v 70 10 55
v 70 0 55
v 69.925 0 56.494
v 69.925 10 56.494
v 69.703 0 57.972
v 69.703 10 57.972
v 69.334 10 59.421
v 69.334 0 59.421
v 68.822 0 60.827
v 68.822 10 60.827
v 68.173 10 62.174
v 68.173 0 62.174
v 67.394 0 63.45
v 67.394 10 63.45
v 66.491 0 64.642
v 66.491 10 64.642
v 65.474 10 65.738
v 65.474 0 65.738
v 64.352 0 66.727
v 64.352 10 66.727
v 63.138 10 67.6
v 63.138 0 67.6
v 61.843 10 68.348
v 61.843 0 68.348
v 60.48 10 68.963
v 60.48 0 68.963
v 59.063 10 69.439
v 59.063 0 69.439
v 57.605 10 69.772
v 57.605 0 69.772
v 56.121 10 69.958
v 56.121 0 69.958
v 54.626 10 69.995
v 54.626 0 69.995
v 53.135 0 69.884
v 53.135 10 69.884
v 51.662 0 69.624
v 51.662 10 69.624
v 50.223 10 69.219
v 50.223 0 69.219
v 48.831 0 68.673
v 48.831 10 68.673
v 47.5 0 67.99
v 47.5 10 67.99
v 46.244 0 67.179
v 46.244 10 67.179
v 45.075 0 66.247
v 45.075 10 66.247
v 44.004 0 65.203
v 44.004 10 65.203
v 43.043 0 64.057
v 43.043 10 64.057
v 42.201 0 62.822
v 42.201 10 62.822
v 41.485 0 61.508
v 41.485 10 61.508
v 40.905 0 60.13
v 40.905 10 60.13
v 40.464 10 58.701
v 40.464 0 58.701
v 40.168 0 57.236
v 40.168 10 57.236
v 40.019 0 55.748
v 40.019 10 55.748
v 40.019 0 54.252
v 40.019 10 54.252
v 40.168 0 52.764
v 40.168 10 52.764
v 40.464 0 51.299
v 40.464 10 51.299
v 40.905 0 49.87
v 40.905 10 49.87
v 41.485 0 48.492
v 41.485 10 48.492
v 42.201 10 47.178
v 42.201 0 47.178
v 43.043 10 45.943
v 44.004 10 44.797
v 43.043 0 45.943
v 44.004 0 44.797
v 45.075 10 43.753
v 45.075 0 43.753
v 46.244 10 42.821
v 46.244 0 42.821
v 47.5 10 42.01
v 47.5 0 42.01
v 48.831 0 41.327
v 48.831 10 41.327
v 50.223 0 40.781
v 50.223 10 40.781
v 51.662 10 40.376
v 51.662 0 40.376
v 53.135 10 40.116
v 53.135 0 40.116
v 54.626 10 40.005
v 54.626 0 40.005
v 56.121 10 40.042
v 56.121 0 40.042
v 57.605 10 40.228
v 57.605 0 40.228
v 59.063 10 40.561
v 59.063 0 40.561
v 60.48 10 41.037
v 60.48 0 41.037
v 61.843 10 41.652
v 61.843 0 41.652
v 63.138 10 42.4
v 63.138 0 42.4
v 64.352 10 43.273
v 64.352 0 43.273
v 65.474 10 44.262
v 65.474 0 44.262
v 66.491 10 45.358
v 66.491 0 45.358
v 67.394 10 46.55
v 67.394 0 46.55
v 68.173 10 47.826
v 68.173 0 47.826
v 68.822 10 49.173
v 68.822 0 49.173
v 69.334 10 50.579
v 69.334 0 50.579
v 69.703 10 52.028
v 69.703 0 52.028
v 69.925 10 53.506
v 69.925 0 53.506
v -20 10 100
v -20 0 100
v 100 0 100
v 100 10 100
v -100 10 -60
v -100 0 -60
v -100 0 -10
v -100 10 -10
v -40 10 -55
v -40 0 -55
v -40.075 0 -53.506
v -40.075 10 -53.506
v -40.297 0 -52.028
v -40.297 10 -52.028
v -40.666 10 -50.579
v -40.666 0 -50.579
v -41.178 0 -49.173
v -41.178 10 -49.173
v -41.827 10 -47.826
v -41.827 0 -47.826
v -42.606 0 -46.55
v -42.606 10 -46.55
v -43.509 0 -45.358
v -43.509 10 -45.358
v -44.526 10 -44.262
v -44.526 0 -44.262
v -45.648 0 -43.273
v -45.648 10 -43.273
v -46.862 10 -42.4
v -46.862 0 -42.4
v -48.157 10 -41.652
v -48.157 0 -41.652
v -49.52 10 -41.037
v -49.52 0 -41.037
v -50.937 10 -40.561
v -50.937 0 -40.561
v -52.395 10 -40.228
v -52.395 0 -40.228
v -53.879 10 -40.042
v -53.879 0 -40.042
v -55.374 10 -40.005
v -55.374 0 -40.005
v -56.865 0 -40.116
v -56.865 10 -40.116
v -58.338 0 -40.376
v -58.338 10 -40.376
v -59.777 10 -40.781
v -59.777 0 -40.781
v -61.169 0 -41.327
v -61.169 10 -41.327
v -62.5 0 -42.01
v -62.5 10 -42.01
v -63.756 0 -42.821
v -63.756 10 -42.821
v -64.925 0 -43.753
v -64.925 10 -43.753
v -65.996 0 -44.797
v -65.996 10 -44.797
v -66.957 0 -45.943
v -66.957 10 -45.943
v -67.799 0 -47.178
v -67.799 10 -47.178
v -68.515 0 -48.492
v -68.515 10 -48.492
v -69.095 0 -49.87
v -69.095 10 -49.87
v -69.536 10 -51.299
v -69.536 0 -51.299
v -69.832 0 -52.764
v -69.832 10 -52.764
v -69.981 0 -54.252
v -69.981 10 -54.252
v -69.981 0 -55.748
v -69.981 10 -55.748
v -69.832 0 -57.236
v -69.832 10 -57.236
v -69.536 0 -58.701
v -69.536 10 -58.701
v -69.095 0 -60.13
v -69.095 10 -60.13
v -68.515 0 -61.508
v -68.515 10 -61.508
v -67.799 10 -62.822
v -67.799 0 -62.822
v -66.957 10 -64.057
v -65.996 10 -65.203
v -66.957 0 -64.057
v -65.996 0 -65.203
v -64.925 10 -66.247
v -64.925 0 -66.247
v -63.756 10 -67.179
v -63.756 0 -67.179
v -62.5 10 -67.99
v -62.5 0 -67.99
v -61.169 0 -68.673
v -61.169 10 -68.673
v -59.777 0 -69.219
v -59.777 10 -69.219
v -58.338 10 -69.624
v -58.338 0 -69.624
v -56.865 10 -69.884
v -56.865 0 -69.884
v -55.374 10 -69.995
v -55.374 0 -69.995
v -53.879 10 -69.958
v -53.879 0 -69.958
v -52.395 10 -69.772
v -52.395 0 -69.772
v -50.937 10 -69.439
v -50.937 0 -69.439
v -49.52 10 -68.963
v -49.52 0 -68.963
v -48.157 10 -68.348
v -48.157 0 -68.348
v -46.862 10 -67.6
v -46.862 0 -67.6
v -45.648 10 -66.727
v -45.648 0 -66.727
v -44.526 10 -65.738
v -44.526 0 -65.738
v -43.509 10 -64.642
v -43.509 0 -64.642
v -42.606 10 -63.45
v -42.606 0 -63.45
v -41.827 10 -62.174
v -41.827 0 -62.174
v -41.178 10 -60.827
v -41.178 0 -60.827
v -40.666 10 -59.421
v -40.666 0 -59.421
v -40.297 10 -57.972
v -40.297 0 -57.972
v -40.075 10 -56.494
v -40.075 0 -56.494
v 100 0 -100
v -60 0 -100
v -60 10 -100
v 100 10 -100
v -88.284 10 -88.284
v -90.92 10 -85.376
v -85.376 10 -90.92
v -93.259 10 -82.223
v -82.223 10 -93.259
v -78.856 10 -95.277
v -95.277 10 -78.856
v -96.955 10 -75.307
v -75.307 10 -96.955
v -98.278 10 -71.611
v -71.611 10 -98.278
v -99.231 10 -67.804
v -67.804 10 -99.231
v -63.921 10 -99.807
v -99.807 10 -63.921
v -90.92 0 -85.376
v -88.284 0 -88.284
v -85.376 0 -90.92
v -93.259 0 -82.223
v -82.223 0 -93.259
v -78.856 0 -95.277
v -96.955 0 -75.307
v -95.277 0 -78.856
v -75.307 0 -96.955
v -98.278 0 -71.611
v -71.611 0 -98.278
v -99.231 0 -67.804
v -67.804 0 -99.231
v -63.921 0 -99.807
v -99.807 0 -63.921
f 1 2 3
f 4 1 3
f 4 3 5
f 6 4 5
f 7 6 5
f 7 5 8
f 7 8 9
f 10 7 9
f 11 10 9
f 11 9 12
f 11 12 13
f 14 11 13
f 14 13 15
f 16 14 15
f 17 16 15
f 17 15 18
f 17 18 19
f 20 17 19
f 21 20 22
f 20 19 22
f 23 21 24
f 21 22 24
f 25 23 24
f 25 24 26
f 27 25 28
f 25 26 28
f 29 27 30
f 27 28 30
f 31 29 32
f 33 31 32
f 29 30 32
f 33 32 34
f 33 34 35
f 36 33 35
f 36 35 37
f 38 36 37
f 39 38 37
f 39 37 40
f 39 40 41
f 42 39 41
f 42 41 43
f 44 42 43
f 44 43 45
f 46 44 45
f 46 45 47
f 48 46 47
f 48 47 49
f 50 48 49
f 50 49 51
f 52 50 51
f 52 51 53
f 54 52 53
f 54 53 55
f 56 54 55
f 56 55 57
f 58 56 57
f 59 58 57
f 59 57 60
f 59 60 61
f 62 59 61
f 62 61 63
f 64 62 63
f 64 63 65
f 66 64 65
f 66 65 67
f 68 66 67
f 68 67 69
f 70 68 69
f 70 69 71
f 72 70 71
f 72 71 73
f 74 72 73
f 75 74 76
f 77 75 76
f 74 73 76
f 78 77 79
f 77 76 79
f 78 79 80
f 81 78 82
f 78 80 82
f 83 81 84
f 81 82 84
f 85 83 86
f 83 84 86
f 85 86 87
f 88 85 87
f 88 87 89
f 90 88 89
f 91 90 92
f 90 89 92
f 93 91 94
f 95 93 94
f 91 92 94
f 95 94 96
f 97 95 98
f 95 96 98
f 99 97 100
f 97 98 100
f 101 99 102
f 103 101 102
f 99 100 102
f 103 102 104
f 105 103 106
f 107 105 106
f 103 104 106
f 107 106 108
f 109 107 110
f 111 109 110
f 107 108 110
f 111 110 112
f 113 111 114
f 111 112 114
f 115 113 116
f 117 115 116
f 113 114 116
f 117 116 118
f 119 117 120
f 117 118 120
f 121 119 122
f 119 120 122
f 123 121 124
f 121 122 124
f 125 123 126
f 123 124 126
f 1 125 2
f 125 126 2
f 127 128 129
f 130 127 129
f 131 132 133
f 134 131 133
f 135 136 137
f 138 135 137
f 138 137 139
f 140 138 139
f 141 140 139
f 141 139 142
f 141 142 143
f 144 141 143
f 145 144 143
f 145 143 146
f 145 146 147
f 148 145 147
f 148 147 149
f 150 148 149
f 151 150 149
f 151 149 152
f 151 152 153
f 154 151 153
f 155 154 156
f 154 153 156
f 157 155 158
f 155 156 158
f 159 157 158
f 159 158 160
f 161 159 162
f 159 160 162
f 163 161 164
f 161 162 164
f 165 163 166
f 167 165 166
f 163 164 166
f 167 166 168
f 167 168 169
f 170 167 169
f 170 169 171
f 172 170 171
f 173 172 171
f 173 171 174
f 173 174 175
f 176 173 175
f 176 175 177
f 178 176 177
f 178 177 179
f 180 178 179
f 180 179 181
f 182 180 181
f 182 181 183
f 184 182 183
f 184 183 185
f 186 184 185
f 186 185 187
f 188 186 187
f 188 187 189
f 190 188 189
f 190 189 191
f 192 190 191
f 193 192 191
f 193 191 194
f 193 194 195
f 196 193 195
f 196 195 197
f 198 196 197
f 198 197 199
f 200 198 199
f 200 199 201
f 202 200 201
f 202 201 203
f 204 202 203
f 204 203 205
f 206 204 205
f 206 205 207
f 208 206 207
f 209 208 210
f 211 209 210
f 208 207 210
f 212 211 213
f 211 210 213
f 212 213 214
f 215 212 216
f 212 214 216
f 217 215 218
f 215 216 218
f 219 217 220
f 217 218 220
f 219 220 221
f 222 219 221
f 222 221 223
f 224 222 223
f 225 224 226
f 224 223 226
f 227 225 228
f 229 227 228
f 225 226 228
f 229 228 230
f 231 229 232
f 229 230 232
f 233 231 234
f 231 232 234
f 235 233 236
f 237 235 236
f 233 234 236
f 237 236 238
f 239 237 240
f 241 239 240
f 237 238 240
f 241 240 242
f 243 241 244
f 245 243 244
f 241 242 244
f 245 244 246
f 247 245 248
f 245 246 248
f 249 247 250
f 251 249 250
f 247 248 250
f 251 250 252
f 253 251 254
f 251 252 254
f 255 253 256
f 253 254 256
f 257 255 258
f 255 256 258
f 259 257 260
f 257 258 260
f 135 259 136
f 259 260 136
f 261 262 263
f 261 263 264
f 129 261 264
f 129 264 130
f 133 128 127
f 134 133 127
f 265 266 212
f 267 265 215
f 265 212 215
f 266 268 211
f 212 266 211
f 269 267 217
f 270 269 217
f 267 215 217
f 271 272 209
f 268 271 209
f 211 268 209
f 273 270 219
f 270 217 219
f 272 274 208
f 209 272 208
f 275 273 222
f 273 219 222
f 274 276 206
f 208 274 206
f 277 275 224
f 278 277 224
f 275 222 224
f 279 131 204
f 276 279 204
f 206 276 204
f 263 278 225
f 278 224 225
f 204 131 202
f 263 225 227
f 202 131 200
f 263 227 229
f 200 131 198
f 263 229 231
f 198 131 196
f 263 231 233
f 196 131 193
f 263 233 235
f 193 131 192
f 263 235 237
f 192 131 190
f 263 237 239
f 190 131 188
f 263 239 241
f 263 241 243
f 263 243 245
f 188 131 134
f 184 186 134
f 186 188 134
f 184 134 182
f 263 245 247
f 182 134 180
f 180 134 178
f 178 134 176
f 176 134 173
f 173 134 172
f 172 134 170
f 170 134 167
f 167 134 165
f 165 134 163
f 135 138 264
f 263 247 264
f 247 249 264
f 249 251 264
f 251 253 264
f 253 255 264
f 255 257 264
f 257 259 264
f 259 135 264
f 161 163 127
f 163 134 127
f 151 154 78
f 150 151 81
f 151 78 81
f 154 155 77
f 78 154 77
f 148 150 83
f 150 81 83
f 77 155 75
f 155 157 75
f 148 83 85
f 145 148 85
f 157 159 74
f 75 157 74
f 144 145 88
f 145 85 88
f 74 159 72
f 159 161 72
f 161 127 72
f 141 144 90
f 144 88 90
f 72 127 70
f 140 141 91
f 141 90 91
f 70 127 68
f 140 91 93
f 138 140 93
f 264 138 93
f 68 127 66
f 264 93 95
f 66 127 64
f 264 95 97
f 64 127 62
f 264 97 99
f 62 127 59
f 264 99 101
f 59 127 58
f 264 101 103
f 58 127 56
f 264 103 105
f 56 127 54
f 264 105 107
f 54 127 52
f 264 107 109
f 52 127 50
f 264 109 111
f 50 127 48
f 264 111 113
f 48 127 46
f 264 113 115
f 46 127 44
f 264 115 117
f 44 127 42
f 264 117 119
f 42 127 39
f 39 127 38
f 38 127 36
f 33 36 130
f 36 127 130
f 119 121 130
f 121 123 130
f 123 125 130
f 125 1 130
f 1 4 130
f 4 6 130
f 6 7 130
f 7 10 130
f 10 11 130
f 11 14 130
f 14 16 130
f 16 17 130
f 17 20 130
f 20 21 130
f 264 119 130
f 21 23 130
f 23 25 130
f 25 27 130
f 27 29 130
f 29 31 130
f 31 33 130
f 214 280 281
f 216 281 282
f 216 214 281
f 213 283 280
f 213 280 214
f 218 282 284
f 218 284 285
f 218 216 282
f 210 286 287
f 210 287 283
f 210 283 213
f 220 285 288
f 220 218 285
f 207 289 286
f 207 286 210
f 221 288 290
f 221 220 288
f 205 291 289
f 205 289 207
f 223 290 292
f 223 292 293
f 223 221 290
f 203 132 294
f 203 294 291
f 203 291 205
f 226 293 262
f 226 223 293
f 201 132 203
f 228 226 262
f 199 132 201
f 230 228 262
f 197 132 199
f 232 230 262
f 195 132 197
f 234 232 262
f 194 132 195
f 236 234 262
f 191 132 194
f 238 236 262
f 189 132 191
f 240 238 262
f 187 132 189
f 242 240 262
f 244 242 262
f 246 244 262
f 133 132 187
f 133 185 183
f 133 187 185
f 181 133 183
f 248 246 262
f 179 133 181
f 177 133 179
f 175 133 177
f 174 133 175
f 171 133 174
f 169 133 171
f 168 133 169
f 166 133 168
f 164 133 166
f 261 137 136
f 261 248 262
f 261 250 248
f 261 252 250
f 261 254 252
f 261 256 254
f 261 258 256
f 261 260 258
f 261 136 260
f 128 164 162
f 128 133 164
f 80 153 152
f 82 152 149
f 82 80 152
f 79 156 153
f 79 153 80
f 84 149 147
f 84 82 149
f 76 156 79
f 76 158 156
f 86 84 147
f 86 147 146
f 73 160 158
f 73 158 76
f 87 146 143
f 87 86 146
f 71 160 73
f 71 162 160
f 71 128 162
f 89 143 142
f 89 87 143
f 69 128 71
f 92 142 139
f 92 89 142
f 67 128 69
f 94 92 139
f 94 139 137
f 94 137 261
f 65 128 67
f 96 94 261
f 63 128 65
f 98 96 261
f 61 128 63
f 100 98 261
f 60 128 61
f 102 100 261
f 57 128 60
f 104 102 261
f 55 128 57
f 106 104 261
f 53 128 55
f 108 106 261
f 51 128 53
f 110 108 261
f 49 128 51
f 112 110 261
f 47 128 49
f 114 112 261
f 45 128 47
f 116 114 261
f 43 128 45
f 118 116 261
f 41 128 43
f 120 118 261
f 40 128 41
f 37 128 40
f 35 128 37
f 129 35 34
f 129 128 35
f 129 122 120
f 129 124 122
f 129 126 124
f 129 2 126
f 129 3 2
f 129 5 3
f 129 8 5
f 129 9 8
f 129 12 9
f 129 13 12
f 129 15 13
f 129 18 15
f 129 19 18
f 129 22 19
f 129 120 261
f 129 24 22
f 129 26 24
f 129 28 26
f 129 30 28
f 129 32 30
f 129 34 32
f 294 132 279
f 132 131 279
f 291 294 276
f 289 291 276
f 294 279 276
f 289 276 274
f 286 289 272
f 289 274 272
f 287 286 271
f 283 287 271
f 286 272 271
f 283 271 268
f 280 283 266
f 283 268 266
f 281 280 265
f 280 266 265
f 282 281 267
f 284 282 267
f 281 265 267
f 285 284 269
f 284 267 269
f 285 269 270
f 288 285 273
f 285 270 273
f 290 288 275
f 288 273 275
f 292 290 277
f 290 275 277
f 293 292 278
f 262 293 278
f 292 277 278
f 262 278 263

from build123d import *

# Parameters (mm, degrees)
F0_W     = 200
F0_H     = 200
F1_DEPTH = 10
F3_R     = 15
F4_DEPTH = 10.001
F5_R     = 40
F6_SIZE2 = 110
F6_SIZE  = 80


with BuildPart() as f1:
    # F0 (on Front) → F1 (new body)
    with BuildSketch(Plane.XZ):
        Rectangle(F0_W, F0_H)
    extrude(amount=-F1_DEPTH)

    # F3 (on face) → F4 (cut, through all)
    with BuildSketch(Plane.XZ):
        with Locations((-55, -55)):
            Circle(F3_R)
        with Locations((55, 55)):
            Circle(F3_R)
    extrude(amount=-F4_DEPTH, mode=Mode.SUBTRACT)

    # F5
    f5_edges = [f1.edges().sort_by_distance(p)[0] for p in [
        (-100, 5, -100),
    ]]
    fillet(f5_edges, radius=F5_R)

    # F6
    f6_edges = [f1.edges().sort_by_distance(p)[0] for p in [
        (-100, 5, 100),
    ]]
    f6_side = f1.faces().sort_by_distance((0, 5, 100))[0]
    chamfer(f6_edges, length=F6_SIZE, length2=F6_SIZE2, reference=f6_side)


solid = f1.part
